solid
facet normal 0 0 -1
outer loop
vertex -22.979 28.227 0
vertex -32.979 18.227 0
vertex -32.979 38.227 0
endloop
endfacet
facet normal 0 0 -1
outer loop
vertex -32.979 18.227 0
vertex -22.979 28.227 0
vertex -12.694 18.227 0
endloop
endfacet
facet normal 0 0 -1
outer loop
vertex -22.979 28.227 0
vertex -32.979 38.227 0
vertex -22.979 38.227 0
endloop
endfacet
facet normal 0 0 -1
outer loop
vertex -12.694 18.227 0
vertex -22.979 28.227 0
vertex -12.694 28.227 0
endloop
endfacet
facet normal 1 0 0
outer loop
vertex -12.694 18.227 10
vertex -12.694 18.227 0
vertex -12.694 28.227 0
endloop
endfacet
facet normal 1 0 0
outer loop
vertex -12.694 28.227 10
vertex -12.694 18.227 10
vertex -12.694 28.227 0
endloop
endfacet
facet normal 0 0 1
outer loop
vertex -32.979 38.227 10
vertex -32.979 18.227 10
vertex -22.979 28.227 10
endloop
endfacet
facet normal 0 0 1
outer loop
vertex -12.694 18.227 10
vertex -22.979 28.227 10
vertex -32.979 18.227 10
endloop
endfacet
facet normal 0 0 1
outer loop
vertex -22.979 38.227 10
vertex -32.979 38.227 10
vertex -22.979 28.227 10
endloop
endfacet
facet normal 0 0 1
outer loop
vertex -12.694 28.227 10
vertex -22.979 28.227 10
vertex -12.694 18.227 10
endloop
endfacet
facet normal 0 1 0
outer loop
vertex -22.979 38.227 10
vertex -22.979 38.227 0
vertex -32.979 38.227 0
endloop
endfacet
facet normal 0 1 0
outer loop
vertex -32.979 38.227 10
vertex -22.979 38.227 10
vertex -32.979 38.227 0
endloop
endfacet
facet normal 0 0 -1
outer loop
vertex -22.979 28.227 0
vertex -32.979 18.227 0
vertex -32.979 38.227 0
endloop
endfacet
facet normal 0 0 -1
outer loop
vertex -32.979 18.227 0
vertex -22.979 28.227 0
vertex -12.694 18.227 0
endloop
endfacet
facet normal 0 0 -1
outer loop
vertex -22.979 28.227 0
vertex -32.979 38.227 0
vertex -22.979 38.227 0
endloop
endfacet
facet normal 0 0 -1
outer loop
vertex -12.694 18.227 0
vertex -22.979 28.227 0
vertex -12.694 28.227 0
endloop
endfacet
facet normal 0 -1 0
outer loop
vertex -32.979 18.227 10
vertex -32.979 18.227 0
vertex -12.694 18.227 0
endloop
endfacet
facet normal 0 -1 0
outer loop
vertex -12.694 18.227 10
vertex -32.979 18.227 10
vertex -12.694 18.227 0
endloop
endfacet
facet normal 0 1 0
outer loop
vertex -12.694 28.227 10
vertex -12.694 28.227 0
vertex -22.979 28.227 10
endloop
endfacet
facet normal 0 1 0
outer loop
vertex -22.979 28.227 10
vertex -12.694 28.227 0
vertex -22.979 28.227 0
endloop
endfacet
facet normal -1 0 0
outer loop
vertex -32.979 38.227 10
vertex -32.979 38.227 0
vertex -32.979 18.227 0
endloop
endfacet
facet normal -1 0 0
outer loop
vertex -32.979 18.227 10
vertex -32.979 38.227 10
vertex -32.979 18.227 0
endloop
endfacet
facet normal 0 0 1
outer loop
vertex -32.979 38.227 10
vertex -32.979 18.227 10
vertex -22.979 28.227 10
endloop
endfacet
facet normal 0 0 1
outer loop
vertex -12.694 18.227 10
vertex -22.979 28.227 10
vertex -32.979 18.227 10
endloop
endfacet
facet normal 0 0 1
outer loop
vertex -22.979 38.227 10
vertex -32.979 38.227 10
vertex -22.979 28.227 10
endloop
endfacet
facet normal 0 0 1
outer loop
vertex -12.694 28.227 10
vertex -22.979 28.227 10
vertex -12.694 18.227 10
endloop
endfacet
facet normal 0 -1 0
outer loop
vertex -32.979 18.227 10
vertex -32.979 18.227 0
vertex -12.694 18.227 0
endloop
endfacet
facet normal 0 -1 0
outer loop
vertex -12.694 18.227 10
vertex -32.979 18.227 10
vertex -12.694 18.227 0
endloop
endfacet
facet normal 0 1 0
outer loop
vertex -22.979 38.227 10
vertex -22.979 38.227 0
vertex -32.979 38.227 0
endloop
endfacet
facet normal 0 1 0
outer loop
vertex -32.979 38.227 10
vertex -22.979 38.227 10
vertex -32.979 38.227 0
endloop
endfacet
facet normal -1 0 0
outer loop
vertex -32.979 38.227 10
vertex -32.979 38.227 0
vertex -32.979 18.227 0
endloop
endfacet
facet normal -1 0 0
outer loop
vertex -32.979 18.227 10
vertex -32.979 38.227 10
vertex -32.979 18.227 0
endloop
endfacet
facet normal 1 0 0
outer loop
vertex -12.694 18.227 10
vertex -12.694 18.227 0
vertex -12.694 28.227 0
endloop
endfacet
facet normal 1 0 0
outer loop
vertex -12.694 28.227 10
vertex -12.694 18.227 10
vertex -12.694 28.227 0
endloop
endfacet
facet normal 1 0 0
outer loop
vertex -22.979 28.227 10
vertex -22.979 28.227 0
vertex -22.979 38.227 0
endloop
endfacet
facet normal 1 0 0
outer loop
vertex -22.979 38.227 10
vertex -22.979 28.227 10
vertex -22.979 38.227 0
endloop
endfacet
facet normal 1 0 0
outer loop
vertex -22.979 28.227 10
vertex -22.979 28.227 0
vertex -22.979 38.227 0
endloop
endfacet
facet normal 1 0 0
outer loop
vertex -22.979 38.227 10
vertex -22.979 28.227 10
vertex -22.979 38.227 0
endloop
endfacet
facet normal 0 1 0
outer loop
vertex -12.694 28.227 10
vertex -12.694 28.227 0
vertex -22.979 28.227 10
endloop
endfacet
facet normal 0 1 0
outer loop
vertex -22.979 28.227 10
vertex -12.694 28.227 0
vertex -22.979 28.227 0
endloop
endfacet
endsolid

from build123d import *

# Parameters (mm, degrees)
F1_DEPTH = 10
F2_DEPTH = 10


with BuildPart() as f1:
    # F0 (on Top) → F1 (new body)
    with BuildSketch(Plane.XY):
        Polygon((-32.979041, 38.226672), (-32.979041, 18.226672), (-12.693504, 18.226672), (-12.693504, 28.226672), (-22.979041, 28.226672), (-22.979041, 38.226672), align=None)
    extrude(amount=F1_DEPTH)


with BuildPart() as f2:
    # F0 (on Top) → F2 (new body)
    with BuildSketch(Plane.XY):
        Polygon((-32.979041, 38.226672), (-32.979041, 18.226672), (-12.693504, 18.226672), (-12.693504, 28.226672), (-22.979041, 28.226672), (-22.979041, 38.226672), align=None)
    extrude(amount=F2_DEPTH)


solid = Compound([f1.part, f2.part])
